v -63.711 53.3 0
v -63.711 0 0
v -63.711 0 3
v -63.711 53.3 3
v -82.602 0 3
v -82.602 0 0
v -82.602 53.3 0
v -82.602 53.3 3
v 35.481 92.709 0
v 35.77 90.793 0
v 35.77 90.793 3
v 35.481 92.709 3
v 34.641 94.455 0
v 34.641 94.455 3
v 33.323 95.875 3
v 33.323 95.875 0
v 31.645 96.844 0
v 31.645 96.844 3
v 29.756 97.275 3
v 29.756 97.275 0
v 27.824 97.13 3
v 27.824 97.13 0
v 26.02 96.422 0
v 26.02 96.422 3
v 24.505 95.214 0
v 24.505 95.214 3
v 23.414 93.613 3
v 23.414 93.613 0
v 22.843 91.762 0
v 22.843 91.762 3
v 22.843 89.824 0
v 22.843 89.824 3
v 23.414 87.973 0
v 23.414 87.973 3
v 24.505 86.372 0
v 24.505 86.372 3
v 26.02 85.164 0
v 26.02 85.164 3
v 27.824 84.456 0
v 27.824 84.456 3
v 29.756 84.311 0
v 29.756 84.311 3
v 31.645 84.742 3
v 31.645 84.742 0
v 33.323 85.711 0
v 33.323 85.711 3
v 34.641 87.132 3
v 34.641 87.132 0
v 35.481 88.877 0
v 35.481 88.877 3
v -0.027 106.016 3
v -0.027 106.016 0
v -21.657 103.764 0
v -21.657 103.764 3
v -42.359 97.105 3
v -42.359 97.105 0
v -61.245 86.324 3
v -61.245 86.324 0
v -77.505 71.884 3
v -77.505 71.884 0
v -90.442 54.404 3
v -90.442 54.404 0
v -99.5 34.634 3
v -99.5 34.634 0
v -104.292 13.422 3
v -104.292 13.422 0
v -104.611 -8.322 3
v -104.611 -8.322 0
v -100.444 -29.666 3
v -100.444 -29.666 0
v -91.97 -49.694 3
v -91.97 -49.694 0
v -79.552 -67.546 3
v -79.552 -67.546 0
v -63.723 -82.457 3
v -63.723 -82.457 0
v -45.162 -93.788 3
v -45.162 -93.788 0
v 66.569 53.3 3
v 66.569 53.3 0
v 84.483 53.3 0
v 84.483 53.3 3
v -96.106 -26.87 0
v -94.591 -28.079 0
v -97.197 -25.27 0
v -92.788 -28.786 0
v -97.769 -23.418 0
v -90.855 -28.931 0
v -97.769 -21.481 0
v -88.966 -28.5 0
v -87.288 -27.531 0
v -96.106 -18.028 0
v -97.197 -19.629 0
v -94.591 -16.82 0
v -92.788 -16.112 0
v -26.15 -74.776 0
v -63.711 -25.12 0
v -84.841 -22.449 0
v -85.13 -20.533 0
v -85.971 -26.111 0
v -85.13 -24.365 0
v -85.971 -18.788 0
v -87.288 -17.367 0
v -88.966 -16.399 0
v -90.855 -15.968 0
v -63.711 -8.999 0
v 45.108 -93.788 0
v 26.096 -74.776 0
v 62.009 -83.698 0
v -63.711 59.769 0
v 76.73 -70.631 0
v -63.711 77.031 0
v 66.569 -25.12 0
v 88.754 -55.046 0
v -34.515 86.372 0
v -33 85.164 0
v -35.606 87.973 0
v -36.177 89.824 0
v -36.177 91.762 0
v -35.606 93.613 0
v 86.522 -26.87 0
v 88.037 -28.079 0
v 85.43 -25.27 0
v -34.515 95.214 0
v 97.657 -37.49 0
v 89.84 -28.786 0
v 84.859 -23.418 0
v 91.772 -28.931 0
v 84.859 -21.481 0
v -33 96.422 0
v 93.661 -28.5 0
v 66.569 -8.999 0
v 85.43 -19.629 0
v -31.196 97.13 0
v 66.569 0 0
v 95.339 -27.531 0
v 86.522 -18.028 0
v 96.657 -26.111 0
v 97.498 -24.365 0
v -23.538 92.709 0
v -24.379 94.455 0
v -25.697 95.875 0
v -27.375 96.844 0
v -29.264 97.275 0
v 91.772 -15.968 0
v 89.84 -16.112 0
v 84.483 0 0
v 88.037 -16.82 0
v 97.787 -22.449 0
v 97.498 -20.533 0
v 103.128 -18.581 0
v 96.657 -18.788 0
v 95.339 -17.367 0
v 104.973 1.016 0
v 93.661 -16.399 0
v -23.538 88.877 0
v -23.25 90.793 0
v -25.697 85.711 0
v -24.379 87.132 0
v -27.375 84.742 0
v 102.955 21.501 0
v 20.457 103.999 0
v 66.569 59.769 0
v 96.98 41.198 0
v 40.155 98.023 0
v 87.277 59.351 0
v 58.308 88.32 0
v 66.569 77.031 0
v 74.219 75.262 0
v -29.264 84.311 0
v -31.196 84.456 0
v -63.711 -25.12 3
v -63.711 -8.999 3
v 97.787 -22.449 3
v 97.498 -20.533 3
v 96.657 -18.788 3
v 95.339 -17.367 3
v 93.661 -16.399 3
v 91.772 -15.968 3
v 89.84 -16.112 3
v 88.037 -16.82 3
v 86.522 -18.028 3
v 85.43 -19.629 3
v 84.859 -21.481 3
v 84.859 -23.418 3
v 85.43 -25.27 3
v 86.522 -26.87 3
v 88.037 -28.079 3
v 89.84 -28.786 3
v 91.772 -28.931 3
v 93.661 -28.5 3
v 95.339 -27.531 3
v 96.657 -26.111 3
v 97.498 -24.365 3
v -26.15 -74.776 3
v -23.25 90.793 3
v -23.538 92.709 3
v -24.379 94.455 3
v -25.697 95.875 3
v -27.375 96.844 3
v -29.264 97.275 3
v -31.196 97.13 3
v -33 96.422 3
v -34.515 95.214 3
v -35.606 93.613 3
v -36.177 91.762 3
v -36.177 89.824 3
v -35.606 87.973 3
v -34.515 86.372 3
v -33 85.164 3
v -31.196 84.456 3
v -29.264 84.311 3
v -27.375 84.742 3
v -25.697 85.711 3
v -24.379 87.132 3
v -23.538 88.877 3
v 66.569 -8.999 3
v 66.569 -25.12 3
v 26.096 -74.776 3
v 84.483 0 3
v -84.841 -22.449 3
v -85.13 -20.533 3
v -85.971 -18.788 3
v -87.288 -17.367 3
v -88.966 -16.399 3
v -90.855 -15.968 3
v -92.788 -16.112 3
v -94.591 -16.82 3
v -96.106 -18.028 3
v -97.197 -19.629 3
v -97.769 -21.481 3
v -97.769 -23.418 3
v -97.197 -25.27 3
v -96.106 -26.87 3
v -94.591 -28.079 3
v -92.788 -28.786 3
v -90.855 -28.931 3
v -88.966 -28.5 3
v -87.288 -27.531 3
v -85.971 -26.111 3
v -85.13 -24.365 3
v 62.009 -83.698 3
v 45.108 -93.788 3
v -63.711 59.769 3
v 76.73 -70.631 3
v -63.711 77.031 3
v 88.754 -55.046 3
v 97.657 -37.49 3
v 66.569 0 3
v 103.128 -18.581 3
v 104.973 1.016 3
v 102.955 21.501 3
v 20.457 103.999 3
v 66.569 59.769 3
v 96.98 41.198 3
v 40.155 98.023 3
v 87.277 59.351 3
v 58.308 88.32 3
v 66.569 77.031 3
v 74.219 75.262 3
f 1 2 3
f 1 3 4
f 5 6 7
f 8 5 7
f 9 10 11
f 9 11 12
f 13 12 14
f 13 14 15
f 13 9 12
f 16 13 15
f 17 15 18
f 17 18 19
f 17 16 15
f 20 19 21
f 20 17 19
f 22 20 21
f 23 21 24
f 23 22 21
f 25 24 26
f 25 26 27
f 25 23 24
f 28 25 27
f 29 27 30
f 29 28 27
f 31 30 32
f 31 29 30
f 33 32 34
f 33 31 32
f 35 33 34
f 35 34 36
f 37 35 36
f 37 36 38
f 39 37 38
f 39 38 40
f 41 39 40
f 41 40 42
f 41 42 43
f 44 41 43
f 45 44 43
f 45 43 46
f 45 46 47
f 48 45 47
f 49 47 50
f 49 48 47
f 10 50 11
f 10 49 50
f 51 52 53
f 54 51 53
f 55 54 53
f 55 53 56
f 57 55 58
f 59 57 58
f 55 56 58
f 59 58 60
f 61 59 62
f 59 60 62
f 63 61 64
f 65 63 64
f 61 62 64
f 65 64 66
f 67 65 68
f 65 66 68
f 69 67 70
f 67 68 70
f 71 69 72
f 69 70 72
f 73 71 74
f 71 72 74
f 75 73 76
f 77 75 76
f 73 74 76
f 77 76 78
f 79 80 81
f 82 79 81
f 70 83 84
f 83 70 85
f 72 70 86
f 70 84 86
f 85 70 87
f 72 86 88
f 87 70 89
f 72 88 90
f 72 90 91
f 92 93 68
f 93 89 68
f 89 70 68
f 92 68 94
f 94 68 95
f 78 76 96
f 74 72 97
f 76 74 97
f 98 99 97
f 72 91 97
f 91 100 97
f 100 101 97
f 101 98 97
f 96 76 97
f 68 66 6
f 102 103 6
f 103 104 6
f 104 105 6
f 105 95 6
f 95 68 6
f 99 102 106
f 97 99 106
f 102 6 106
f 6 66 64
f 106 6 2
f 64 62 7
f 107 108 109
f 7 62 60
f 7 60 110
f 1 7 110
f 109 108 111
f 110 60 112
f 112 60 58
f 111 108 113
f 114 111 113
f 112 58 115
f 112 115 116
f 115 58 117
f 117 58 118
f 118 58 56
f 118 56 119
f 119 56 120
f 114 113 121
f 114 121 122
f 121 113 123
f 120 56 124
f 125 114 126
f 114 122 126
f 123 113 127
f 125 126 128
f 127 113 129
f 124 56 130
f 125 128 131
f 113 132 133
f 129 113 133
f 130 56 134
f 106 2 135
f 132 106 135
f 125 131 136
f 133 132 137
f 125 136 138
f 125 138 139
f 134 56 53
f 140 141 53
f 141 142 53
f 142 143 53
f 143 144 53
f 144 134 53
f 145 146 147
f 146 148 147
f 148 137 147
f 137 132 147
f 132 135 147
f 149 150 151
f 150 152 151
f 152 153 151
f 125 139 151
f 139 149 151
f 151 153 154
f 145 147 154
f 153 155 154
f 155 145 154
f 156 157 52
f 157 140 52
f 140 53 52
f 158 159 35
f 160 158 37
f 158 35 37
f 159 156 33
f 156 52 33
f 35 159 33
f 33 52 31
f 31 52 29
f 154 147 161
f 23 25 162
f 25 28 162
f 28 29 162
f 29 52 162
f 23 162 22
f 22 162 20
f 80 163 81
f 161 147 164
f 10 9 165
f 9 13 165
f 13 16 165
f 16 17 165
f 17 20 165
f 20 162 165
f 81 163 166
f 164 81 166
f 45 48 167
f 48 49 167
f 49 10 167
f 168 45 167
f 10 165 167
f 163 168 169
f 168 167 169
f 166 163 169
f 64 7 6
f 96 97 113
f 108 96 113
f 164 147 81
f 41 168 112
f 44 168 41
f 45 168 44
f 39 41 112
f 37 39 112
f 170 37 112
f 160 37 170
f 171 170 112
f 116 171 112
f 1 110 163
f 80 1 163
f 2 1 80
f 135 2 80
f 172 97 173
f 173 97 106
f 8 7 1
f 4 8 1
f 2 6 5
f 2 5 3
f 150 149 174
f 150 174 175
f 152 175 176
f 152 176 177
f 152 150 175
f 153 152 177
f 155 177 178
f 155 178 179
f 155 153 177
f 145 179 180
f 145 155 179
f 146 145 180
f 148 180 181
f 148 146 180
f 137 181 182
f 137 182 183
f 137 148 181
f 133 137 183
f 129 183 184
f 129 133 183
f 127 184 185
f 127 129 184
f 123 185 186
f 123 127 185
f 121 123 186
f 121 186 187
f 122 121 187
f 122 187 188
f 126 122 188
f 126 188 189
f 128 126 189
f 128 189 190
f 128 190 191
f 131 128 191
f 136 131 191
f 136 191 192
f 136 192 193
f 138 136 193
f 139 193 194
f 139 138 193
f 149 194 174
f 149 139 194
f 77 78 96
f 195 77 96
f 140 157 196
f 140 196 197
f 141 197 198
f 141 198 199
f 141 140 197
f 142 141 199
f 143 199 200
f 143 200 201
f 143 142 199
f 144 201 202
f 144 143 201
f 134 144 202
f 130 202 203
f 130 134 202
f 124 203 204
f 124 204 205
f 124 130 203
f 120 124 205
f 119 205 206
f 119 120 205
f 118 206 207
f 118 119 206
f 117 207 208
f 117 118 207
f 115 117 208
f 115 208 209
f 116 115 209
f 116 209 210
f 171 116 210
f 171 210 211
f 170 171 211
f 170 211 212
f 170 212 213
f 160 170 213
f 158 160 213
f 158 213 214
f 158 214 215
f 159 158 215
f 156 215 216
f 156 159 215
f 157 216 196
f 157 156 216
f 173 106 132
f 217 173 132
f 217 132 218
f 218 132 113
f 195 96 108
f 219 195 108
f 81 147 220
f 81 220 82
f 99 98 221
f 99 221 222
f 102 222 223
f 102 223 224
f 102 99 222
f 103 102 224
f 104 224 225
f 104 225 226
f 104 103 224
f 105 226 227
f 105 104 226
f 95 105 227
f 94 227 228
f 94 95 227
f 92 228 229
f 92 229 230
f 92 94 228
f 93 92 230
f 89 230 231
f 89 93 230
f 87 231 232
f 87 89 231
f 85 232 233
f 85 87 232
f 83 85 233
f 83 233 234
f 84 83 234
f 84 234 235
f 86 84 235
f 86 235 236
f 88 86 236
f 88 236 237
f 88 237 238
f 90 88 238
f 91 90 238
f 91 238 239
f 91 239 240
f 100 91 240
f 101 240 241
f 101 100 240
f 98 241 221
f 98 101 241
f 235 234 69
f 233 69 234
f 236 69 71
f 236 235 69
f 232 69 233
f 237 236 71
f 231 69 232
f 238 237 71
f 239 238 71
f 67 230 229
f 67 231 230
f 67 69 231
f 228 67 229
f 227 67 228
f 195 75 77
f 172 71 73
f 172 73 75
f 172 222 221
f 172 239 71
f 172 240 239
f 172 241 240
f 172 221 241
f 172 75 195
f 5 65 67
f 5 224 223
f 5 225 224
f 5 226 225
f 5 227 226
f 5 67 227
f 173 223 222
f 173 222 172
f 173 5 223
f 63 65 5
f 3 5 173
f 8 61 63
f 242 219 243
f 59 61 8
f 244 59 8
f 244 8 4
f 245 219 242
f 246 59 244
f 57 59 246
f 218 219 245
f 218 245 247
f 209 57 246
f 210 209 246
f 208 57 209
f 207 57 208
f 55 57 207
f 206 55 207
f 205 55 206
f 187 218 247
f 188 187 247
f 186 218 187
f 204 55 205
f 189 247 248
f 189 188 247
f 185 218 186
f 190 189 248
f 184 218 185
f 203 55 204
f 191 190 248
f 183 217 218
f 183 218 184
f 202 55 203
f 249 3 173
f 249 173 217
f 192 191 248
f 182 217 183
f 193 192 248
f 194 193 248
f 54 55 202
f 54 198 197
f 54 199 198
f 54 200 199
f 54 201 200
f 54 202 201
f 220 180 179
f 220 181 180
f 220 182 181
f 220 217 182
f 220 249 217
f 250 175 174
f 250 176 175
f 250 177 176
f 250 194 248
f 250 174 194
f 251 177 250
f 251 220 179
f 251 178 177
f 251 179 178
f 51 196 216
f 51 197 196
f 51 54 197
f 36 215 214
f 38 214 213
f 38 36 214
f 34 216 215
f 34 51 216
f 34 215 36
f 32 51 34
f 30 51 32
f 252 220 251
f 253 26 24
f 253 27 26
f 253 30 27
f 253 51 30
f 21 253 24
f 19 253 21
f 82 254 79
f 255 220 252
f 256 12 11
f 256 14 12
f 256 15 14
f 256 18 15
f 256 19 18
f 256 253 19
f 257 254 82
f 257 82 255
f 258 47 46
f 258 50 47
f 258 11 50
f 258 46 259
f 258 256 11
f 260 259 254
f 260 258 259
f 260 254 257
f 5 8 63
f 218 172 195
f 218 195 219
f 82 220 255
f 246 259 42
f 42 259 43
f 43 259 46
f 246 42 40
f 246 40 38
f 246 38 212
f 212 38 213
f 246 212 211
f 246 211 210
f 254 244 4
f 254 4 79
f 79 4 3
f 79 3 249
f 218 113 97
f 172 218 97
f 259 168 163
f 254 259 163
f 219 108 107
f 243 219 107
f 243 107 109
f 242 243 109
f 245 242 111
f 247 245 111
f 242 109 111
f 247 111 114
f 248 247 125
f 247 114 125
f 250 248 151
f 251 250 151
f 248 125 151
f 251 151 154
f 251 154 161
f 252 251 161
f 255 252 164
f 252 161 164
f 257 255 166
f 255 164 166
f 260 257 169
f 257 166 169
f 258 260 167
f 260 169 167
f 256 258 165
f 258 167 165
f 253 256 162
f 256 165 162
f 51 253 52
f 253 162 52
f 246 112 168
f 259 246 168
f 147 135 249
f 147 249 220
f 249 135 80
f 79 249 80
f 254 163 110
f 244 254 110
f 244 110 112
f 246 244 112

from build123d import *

# Parameters (mm, degrees)
F0_R     = 6.5
F0_W     = 18.890693
F0_H     = 53.3
F0_W_2   = 17.913587
F1_DEPTH = 3


with BuildPart() as f1:
    # F0 (on Top) → F1 (new body)
    with BuildSketch(Plane.XY):
        with BuildLine():
            Line((-0.027255, 77.031374), (-0.027255, 106.016069))
            ThreePointArc((-0.027255, 106.016069), (-102.446612, 24.152087), (-45.162038, -93.788211))
            Line((-45.162038, -93.788211), (-26.15007, -74.776243))
            Line((-26.15007, -74.776243), (-0.027255, -74.776243))
            Line((-0.027255, -74.776243), (-0.027255, -63.699956))
            Line((-0.027255, -63.699956), (-0.027255, -48.653428))
            Line((-0.027255, -48.653428), (-0.027255, -25.119923))
            Line((-0.027255, -25.119923), (-63.711368, -25.119923))
            Line((-63.711368, -25.119923), (-63.711368, -8.998516))
            Line((-63.711368, -8.998516), (-0.027255, -8.998516))
            Line((-0.027255, -8.998516), (-0.027255, 0))
            Line((-0.027255, 0), (-50.827254, 0))
            Line((-50.827254, 0), (-50.827254, 53.3))
            Line((-50.827254, 53.3), (-0.027255, 53.3))
            Line((-0.027255, 53.3), (-0.027255, 59.769183))
            Line((-0.027255, 59.769183), (-63.711368, 59.769183))
            Line((-63.711368, 59.769183), (-63.711368, 77.031374))
            Line((-63.711368, 77.031374), (-0.027255, 77.031374))
        make_face()
        with Locations((-91.341169, -22.449345)):
            Circle(F0_R, mode=Mode.SUBTRACT)
        with Locations((-73.156714, 26.65)):
            Rectangle(F0_W, F0_H, mode=Mode.SUBTRACT)
        with Locations((-29.749685, 90.793084)):
            Circle(F0_R, mode=Mode.SUBTRACT)
        with BuildLine():
            ThreePointArc((45.107527, -93.788211), (88.753802, -55.045718), (104.972745, 1.016069))
            ThreePointArc((104.972745, 1.016069), (74.218957, 75.262281), (-0.027255, 106.016069))
            Line((-0.027255, 106.016069), (-0.027255, 77.031374))
            Line((-0.027255, 77.031374), (66.569284, 77.031374))
            Line((66.569284, 77.031374), (66.569284, 59.769183))
            Line((66.569284, 59.769183), (-0.027255, 59.769183))
            Line((-0.027255, 59.769183), (-0.027255, 53.3))
            Line((-0.027255, 53.3), (50.772746, 53.3))
            Line((50.772746, 53.3), (50.772746, 0))
            Line((50.772746, 0), (-0.027255, 0))
            Line((-0.027255, 0), (-0.027255, -8.998516))
            Line((-0.027255, -8.998516), (66.569284, -8.998516))
            Line((66.569284, -8.998516), (66.569284, -25.119923))
            Line((66.569284, -25.119923), (-0.027255, -25.119923))
            Line((-0.027255, -25.119923), (-0.027255, -48.653428))
            Line((-0.027255, -48.653428), (-0.027255, -63.699956))
            Line((-0.027255, -63.699956), (-0.027255, -74.776243))
            Line((-0.027255, -74.776243), (26.095559, -74.776243))
            Line((26.095559, -74.776243), (45.107527, -93.788211))
        make_face()
        with Locations((91.286659, -22.449345)):
            Circle(F0_R, mode=Mode.SUBTRACT)
        with Locations((75.526077, 26.65)):
            Rectangle(F0_W_2, F0_H, mode=Mode.SUBTRACT)
        with Locations((29.269962, 90.793084)):
            Circle(F0_R, mode=Mode.SUBTRACT)
        Polygon((50.772746, 53.3), (-0.027255, 53.3), (-0.027255, 1.016069), (-0.027255, 0), (50.772746, 0), align=None)
        Polygon((-0.027255, 1.016069), (-0.027255, 53.3), (-50.827254, 53.3), (-50.827254, 0), (-0.027255, 0), align=None)
    extrude(amount=F1_DEPTH)


solid = f1.part
